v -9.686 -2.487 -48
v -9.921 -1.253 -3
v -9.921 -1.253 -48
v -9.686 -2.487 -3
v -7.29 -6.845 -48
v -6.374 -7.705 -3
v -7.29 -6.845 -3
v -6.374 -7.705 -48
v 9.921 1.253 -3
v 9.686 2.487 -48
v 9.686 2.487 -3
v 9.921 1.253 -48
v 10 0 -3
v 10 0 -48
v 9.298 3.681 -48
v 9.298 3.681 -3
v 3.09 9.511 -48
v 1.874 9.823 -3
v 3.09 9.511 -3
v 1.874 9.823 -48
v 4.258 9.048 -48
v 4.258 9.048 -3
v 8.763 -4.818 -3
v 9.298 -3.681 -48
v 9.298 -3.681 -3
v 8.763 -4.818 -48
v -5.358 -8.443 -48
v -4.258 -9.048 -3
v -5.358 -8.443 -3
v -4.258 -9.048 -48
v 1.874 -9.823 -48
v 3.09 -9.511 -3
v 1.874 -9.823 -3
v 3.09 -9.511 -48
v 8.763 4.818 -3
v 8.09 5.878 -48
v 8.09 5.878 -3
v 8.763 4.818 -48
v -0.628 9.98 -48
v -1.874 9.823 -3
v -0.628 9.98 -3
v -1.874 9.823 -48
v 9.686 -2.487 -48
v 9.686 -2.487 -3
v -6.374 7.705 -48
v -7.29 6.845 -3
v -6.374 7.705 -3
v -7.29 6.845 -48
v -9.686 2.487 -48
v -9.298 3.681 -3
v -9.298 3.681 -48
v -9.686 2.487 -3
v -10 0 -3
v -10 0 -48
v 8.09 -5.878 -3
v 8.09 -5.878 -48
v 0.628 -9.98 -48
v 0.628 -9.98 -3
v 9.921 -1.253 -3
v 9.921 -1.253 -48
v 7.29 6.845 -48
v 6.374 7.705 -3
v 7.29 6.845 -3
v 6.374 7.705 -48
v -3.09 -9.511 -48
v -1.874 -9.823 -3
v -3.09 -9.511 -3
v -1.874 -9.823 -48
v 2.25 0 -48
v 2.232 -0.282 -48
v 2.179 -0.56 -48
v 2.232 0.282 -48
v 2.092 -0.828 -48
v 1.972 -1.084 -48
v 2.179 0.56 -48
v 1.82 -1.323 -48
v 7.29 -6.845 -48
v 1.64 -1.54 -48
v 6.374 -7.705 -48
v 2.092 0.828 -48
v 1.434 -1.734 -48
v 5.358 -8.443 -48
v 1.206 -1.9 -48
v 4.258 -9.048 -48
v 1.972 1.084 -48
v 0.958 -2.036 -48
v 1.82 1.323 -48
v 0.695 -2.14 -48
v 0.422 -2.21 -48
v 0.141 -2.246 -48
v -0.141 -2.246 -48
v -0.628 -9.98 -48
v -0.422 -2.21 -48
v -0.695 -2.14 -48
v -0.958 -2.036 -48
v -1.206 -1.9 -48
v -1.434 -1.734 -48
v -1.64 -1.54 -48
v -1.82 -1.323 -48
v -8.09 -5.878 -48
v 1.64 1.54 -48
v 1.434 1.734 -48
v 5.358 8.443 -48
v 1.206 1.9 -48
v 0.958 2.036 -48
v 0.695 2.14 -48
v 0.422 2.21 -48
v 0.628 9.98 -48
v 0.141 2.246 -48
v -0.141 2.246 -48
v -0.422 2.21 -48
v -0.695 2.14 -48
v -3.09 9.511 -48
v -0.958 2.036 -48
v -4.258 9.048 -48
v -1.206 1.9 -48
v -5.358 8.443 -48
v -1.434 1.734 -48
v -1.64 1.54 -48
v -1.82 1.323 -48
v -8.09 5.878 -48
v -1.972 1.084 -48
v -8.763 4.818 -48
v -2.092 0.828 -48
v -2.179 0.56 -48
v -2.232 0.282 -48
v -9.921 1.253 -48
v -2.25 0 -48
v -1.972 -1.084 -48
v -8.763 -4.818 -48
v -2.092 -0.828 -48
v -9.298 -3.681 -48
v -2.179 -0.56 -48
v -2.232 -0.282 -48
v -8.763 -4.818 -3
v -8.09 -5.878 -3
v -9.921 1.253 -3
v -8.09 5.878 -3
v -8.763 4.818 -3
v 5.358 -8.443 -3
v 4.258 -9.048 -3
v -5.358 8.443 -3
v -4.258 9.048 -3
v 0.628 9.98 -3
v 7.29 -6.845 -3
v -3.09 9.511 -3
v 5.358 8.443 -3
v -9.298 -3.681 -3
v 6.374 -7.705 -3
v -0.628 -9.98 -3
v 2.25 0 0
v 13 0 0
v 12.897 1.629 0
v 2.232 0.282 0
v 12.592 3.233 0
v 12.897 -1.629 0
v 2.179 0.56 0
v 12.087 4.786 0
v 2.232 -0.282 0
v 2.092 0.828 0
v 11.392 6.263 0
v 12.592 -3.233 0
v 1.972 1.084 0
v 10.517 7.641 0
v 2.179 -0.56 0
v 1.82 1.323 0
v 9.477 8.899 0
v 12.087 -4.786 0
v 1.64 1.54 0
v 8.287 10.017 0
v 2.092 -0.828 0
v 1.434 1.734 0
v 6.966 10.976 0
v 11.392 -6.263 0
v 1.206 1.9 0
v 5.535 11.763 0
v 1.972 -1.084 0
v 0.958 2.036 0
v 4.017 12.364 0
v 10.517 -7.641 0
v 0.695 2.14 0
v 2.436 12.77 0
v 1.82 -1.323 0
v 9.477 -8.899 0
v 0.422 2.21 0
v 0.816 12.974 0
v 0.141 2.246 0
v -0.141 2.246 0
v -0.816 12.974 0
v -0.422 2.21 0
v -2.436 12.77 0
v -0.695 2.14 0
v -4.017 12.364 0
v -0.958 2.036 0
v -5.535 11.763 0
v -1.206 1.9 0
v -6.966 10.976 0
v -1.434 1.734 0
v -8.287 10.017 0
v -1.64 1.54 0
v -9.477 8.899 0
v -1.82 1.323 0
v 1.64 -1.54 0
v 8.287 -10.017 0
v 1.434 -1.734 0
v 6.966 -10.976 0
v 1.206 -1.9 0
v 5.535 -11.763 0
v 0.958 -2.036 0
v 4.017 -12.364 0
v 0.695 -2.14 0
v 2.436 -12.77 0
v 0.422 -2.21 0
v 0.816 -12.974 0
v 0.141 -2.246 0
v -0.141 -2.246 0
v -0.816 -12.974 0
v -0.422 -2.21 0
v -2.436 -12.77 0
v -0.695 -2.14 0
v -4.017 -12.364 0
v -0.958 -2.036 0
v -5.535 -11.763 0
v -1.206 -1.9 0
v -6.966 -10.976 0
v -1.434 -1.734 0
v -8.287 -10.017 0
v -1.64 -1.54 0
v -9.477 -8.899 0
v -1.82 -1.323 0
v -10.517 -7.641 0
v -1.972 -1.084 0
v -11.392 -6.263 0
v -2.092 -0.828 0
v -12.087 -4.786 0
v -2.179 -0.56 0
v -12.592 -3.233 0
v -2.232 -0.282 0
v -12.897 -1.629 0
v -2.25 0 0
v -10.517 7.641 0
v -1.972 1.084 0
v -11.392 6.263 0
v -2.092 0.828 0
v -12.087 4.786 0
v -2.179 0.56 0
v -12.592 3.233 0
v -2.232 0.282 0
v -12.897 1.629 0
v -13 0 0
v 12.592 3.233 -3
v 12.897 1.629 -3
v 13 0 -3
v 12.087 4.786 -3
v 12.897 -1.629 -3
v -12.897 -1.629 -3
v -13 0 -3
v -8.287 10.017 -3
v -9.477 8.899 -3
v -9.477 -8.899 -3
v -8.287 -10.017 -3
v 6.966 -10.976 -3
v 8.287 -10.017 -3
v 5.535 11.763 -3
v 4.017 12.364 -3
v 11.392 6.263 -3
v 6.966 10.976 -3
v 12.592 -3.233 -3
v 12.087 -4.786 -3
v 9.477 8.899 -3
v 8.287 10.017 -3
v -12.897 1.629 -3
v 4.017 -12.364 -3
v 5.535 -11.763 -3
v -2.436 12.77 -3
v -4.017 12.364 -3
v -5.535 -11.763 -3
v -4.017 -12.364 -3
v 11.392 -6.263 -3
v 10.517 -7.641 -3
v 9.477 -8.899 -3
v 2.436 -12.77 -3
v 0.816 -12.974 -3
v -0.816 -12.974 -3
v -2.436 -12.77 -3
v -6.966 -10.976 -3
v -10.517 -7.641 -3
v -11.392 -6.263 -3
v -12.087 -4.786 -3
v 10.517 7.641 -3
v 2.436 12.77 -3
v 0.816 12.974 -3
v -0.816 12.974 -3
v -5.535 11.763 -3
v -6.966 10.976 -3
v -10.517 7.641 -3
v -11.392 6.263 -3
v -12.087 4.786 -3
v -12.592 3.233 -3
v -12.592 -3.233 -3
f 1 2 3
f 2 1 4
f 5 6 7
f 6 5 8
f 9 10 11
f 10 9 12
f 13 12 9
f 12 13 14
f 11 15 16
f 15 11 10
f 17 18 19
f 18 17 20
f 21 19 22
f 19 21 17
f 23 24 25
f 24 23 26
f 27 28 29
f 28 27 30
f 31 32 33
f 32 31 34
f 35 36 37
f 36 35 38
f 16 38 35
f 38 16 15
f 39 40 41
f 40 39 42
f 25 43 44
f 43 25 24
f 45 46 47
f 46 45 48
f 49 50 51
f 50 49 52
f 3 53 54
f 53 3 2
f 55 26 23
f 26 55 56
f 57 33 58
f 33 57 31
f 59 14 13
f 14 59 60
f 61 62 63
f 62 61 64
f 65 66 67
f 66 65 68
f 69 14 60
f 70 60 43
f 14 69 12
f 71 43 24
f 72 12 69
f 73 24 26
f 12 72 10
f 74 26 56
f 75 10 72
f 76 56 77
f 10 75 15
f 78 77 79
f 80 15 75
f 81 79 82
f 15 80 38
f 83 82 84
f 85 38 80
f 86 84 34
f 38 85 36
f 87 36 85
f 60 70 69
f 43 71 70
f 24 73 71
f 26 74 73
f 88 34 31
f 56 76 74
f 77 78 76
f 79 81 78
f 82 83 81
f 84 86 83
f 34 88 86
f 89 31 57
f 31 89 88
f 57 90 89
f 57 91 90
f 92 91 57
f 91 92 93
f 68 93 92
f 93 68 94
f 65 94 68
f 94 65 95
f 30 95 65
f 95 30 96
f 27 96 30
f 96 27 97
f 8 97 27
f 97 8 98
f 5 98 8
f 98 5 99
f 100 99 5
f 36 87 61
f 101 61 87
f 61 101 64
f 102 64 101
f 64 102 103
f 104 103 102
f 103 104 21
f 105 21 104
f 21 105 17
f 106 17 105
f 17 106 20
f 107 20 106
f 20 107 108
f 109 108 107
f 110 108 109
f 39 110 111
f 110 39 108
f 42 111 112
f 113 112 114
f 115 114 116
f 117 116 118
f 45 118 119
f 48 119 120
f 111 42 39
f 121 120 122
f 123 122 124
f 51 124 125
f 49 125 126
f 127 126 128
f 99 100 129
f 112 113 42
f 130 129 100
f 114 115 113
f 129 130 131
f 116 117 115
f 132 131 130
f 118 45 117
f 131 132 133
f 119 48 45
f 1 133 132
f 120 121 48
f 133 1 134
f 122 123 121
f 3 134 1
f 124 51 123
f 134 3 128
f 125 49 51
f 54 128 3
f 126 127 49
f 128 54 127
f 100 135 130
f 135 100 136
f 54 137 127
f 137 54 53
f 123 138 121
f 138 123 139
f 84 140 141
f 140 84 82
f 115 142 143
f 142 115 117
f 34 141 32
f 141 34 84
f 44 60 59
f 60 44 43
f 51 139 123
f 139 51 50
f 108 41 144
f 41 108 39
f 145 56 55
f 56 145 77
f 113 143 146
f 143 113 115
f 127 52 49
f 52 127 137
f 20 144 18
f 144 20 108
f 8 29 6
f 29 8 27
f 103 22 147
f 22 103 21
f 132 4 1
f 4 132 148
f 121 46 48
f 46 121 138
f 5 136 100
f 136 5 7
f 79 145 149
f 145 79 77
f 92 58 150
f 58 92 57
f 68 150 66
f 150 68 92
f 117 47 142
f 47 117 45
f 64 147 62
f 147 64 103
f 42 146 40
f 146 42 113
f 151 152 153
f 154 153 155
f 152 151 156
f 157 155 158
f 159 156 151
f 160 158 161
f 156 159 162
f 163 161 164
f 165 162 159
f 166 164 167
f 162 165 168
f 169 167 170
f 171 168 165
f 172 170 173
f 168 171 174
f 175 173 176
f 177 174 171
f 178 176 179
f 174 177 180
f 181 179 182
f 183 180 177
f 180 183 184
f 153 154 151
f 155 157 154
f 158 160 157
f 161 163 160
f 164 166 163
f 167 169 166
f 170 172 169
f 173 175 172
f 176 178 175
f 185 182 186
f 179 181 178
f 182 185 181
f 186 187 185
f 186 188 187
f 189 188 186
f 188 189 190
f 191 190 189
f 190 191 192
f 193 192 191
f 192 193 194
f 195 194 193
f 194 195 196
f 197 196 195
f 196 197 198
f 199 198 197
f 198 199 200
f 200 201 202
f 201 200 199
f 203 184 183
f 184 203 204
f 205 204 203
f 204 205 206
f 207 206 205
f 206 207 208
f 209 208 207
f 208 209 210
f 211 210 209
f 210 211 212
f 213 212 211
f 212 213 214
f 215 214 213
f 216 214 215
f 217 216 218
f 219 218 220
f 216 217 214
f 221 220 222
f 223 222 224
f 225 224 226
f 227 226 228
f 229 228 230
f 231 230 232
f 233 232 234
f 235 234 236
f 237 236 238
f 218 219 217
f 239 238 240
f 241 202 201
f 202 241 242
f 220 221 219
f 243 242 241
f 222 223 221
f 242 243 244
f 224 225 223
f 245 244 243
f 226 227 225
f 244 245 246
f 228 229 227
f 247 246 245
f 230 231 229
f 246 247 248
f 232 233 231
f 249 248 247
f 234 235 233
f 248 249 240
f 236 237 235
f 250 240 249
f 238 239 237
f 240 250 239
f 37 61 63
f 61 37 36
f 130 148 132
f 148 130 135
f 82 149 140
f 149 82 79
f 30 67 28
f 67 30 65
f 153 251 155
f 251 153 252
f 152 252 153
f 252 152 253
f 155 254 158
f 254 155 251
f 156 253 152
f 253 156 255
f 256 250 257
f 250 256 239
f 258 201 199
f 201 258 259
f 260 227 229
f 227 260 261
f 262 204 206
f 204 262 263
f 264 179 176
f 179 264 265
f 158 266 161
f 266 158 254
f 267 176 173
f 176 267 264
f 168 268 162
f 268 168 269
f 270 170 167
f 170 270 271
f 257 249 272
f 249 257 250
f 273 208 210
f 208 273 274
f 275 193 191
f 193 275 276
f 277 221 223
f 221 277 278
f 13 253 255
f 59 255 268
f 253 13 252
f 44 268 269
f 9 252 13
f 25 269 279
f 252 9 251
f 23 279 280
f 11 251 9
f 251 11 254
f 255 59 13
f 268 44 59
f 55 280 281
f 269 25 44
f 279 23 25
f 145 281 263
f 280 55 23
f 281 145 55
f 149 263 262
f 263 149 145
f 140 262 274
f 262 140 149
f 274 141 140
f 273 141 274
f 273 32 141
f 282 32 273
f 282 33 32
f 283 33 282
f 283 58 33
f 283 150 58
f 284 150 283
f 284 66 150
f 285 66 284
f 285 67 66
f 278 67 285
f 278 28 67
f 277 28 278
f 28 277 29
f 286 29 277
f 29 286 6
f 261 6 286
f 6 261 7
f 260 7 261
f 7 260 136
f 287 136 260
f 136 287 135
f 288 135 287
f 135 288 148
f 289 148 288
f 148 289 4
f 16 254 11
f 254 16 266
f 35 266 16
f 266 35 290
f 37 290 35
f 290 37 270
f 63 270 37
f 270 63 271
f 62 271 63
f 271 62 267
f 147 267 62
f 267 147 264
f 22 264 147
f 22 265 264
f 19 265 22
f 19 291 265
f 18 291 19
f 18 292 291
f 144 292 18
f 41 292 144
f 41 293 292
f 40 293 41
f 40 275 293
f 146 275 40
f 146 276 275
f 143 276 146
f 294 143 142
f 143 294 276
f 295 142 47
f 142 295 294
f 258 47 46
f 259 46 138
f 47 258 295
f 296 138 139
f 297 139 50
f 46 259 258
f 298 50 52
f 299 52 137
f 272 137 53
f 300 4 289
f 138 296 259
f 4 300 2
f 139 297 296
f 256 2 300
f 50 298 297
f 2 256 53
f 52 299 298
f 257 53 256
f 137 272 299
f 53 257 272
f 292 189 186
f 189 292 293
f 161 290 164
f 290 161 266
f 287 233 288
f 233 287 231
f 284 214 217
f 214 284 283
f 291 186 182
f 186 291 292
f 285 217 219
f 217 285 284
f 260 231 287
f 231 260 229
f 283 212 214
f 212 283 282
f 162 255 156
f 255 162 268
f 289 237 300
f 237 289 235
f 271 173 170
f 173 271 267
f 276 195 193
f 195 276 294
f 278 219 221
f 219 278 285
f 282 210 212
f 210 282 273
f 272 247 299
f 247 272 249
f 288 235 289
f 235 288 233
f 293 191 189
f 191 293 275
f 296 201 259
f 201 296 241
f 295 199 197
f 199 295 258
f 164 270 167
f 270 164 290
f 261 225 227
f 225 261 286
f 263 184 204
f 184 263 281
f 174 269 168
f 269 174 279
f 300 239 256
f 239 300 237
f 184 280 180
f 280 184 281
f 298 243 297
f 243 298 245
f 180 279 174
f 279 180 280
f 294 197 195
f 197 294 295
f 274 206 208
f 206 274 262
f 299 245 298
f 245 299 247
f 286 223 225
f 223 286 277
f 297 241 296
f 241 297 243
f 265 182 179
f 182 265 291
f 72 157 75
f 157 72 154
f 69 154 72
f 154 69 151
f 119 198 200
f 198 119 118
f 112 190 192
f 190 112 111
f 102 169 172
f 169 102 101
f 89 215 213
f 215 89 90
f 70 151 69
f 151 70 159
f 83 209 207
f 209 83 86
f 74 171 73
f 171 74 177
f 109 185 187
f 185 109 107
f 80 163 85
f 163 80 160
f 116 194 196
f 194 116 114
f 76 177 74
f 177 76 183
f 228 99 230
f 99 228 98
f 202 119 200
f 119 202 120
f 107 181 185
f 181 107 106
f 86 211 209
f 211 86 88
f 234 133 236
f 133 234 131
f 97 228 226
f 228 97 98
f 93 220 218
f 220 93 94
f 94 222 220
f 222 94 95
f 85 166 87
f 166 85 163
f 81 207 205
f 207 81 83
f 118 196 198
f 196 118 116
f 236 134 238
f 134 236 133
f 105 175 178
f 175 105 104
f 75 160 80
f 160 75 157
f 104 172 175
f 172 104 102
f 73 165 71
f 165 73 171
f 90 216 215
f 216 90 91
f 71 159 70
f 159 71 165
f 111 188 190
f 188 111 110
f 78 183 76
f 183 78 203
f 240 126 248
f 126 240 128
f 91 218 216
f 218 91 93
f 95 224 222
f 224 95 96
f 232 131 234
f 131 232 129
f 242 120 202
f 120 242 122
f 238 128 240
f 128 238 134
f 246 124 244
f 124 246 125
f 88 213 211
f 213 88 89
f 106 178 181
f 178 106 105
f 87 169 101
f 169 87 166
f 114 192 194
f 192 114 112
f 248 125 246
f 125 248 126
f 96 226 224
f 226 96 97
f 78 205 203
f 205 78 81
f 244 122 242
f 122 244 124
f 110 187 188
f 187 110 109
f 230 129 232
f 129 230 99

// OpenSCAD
$fn = 50;


difference() {
	union() {
		translate(v = [0, 0, -48.0000000000]) {
			cylinder(h = 48, r = 10.0000000000);
		}
		translate(v = [0, 0, -3.0000000000]) {
			cylinder(h = 3, r = 13.0000000000);
		}
	}
	union() {
		#translate(v = [0, 0, -48]) {
			cylinder(h = 48, r = 2.2500000000);
		}
	}
}
